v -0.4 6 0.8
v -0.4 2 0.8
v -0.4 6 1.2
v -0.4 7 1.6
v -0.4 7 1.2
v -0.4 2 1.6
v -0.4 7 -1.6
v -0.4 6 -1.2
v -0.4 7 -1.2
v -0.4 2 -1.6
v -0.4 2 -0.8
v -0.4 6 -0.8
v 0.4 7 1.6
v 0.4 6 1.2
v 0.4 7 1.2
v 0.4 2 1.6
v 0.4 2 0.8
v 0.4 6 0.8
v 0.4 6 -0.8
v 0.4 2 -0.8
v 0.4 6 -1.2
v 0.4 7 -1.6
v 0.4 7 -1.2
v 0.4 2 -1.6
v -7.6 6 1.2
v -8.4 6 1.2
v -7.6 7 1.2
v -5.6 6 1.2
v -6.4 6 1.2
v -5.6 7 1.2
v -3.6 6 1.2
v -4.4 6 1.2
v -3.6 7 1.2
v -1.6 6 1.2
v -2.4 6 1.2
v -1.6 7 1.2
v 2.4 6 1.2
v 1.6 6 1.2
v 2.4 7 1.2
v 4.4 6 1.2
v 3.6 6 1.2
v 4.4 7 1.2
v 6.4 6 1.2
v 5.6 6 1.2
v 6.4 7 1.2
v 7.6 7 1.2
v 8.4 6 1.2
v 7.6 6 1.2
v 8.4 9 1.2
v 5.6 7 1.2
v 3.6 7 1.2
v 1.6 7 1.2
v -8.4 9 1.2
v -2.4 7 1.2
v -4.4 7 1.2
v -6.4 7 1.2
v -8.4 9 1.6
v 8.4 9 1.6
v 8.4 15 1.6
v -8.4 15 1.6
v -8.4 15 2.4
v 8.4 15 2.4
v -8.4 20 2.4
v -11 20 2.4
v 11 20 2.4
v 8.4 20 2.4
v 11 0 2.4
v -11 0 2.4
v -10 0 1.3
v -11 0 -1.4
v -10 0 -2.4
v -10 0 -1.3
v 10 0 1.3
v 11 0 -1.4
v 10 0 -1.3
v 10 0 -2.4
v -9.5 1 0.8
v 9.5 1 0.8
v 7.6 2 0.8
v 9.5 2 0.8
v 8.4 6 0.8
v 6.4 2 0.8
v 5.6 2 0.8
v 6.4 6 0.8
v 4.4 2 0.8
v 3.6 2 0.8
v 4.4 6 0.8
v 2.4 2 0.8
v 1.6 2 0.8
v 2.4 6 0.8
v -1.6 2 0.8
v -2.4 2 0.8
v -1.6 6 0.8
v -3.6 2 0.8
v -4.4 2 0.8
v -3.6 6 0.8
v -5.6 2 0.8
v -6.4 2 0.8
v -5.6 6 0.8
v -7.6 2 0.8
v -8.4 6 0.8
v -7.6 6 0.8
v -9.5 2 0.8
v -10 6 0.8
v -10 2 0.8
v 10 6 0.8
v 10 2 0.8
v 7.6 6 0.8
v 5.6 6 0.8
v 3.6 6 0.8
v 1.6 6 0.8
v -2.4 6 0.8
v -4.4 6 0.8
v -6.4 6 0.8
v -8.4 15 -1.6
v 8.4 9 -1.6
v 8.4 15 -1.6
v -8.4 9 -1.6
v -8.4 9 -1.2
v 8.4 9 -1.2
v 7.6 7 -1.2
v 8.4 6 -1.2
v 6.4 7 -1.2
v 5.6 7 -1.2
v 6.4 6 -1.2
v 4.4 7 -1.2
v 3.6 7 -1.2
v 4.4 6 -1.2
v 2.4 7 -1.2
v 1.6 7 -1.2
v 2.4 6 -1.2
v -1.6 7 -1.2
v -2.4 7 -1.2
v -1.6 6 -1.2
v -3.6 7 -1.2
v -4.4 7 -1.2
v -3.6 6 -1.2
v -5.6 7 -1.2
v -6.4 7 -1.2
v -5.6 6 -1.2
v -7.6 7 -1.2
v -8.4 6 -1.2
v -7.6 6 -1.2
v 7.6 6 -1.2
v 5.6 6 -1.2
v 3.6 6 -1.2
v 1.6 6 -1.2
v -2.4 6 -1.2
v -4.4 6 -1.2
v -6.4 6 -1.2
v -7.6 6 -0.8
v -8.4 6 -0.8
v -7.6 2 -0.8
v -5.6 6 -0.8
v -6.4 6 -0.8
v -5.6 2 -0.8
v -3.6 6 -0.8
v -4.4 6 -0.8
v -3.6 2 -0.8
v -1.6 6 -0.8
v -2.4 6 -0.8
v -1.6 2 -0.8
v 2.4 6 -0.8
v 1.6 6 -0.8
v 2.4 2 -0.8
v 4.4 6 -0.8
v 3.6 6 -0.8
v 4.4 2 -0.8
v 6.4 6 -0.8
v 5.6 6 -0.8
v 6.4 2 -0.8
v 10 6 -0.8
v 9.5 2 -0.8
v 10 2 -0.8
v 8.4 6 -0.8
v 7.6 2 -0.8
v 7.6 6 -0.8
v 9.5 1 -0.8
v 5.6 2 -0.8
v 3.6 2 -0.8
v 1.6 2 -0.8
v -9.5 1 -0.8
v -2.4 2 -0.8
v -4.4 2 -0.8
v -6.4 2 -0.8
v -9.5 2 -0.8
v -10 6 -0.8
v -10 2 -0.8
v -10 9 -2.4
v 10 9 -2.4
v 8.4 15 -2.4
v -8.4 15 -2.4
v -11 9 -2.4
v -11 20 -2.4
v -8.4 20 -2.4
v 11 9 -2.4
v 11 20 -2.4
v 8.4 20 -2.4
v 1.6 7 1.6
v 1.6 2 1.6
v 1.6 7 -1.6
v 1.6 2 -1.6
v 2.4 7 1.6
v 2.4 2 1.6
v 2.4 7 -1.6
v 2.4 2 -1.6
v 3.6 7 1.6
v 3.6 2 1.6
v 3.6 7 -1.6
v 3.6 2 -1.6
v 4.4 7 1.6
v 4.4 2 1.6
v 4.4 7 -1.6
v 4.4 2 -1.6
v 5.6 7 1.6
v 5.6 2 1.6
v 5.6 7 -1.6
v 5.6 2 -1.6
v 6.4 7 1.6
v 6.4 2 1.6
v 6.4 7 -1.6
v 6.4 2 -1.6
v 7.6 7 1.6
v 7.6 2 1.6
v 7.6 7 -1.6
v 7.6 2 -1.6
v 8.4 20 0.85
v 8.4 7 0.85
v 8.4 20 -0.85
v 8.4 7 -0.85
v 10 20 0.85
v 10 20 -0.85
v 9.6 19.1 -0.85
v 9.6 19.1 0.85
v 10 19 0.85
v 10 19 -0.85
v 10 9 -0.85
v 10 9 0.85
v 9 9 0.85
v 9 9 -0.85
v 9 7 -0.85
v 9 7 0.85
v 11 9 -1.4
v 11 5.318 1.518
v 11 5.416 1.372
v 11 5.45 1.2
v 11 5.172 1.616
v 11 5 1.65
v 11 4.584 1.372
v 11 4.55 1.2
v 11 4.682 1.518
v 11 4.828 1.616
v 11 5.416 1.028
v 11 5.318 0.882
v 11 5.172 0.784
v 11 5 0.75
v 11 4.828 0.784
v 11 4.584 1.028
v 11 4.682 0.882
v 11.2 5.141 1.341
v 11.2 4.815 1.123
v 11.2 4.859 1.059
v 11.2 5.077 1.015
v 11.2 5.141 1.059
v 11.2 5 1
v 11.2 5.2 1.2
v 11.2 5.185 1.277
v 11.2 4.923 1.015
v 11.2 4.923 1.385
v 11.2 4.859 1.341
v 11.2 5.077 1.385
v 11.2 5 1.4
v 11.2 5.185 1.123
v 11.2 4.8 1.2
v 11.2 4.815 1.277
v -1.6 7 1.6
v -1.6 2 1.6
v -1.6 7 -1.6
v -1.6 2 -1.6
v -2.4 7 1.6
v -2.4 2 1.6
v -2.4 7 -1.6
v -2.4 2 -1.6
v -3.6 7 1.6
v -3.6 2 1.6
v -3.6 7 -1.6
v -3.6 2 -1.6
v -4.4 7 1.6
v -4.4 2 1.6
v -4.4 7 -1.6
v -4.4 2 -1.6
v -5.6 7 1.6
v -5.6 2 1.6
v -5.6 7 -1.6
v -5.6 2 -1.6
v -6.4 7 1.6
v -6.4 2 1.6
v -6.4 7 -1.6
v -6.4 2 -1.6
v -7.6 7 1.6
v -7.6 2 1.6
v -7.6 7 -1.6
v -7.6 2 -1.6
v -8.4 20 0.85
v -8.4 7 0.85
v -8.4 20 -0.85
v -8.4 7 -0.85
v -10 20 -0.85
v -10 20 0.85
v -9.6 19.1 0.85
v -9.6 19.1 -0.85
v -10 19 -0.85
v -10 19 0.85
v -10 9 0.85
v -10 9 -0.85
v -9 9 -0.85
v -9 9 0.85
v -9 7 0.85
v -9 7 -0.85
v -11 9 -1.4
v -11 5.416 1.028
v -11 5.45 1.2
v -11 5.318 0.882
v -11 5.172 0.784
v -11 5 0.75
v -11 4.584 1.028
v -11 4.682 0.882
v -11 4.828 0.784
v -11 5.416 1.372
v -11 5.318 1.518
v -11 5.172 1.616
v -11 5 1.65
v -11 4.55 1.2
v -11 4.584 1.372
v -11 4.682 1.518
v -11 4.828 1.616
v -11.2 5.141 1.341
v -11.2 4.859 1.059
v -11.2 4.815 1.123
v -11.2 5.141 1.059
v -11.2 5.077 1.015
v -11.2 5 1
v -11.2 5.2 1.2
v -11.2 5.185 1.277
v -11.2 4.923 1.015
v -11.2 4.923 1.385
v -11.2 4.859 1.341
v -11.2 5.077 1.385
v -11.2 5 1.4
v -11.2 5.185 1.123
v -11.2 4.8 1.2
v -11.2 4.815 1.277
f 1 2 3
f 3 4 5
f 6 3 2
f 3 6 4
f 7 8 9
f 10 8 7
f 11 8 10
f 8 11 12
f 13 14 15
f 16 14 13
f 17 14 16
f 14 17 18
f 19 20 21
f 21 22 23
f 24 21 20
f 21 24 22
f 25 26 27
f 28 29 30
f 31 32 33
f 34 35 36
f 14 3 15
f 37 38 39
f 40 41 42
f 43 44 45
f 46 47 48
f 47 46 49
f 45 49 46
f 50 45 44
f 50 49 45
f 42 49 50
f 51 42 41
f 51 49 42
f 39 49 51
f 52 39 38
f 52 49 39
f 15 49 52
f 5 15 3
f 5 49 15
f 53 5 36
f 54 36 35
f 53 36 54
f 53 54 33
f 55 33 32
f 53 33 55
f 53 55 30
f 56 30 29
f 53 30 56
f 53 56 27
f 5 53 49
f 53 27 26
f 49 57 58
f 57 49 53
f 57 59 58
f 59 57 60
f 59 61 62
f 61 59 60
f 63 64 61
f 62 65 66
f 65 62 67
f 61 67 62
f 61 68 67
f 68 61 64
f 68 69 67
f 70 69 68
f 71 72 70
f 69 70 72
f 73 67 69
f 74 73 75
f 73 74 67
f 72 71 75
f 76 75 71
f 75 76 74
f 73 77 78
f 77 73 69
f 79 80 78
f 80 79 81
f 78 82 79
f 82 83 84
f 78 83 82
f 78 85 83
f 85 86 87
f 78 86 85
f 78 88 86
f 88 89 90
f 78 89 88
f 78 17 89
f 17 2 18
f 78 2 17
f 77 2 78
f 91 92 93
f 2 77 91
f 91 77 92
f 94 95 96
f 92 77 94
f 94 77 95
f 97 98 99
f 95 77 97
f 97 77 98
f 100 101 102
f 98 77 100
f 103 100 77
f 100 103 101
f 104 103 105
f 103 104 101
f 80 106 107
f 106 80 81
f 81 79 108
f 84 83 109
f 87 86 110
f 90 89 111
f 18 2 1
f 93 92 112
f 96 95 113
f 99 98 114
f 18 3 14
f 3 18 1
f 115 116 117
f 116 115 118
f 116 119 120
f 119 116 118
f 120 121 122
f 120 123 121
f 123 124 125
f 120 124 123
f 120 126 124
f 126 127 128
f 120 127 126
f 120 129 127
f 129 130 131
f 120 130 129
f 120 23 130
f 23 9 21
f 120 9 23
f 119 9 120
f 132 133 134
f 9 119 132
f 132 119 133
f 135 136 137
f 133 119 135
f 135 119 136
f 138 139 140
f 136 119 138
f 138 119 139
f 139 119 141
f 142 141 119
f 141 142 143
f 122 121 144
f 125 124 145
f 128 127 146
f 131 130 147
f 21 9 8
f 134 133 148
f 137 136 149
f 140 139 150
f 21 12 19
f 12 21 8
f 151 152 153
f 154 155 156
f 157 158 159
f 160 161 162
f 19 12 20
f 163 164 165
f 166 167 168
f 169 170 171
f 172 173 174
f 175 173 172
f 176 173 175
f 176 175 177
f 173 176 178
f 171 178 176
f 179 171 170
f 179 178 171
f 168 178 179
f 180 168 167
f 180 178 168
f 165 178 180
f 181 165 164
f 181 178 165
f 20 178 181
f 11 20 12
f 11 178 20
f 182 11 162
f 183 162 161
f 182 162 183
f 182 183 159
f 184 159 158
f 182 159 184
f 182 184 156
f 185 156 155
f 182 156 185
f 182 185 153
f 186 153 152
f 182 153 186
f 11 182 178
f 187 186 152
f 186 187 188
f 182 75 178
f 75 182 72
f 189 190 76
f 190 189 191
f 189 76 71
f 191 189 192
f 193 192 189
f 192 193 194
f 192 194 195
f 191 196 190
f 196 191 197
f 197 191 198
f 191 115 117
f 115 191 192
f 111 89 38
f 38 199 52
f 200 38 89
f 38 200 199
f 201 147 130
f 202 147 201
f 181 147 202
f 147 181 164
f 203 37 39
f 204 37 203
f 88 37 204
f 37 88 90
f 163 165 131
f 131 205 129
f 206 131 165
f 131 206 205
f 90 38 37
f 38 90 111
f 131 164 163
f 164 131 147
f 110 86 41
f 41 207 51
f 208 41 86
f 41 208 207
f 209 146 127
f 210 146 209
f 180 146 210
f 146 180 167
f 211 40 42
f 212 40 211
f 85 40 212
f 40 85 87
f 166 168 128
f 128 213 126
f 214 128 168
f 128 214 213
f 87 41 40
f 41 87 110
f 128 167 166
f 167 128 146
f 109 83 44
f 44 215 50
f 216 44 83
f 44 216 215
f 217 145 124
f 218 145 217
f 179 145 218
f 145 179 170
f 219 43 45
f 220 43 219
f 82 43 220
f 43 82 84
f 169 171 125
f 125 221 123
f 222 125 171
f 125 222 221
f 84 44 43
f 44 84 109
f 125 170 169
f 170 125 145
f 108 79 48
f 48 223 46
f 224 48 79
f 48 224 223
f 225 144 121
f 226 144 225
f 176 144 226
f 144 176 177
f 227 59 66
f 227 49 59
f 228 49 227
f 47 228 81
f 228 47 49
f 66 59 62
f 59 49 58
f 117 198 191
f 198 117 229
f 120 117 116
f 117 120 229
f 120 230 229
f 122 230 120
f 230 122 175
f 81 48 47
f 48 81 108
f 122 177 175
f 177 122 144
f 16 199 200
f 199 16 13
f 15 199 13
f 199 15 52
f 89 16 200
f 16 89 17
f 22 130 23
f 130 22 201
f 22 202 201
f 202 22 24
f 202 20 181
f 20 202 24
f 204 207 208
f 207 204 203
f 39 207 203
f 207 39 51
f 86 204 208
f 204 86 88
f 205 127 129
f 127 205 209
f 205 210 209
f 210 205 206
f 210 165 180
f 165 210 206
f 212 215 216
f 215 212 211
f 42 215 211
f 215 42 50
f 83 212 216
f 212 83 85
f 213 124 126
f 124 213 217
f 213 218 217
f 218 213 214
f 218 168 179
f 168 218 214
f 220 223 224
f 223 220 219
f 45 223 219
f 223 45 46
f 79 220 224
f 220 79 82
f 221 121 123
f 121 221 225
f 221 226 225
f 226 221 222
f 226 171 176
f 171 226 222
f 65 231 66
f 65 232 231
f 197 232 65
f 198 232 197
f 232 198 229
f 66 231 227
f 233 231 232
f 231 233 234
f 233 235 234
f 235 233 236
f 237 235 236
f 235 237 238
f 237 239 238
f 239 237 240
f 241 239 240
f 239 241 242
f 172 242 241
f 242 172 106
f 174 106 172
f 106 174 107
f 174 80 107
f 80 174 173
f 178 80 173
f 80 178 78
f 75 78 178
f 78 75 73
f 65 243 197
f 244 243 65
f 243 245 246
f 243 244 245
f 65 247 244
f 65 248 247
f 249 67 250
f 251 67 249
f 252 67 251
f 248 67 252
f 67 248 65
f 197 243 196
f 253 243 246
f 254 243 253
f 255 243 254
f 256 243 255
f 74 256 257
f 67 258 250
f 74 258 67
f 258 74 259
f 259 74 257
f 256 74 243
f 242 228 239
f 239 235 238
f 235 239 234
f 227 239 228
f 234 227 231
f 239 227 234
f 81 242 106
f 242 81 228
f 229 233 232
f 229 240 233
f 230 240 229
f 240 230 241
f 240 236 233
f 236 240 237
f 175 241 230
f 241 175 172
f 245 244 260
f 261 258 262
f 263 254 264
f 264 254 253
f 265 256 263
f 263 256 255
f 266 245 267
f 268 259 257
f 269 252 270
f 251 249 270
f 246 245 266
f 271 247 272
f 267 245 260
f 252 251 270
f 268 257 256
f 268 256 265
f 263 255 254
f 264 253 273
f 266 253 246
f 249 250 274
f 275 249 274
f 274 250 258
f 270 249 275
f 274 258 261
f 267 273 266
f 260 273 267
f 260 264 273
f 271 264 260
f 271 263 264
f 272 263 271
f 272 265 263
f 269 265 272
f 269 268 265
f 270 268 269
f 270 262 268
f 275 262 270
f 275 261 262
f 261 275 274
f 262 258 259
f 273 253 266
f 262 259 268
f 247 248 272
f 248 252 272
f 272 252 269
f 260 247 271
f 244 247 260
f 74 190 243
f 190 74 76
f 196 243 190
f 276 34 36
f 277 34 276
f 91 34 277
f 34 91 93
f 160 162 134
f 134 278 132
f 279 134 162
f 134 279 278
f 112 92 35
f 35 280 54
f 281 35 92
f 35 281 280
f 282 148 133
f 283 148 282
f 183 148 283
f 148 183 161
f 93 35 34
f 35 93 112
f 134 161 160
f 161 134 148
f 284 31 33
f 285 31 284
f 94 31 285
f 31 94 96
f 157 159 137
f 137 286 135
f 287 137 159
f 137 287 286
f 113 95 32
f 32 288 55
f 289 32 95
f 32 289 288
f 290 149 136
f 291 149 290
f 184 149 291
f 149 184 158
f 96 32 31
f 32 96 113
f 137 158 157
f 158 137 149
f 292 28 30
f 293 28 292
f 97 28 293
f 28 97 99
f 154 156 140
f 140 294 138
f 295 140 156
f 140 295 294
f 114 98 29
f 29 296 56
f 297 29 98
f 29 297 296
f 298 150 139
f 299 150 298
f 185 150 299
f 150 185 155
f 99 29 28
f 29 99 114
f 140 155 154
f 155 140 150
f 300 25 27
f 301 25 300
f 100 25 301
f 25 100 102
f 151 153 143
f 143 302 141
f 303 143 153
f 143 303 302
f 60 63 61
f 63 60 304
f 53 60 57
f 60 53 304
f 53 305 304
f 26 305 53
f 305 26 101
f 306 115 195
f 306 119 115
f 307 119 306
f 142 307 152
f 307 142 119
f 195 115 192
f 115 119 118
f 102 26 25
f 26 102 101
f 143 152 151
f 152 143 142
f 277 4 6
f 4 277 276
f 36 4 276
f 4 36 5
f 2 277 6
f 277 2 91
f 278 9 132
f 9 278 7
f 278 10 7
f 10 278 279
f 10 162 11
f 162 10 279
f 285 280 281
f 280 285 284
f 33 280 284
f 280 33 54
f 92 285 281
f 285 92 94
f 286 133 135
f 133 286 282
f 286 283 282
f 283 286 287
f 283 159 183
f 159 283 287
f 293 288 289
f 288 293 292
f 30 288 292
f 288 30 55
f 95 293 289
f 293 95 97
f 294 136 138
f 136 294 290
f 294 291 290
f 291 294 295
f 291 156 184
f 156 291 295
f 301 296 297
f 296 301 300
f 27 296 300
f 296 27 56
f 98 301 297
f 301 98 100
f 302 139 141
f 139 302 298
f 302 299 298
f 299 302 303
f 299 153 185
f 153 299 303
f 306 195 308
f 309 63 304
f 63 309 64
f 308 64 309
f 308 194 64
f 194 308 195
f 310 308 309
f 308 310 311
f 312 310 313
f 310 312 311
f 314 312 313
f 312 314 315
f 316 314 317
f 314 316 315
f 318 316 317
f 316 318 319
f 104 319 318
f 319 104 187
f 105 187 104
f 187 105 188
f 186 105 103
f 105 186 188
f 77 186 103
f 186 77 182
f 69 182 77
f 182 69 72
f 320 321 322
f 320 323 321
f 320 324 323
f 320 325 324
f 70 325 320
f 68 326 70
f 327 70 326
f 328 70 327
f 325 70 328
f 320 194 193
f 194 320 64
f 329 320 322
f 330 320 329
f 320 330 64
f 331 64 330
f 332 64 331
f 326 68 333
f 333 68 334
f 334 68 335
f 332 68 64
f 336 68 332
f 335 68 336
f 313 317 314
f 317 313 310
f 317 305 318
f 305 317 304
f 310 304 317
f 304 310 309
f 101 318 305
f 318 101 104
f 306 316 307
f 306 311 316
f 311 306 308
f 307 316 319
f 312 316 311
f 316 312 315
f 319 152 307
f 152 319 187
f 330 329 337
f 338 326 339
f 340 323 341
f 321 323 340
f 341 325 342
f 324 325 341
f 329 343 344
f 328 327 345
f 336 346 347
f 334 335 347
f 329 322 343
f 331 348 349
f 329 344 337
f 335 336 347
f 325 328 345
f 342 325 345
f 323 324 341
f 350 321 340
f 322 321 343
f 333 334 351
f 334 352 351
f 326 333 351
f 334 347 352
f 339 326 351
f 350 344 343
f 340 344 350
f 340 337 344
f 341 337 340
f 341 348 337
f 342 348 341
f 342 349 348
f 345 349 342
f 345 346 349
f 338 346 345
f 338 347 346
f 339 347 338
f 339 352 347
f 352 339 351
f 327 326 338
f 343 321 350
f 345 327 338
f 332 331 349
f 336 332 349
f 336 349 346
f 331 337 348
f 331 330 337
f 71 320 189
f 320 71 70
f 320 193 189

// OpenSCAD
CUTAWAY_TOP = true;
CUTAWAY_SIDE = false;
MODEL = "A";
SHOW_PARTS = true;
TRANSFORM = 0;

BOARD_CLIP_DEPTH = 0.4;
BOARD_SIDE_TOL = 0.1;
BOARD_END_TOL = 0.1;
BOARD_THICK_TOL = 0.05;

module mirrcpy(axis) {
    children();
    mirror(axis) children();
}

module final_transform() {
    if(TRANSFORM == 3) {
        rotate([90,0,0])
        children();
    } else if(TRANSFORM == 2) {
        rotate([-90,0,0])
        translate([0,-20,0])
        children();
    } else if(TRANSFORM == 1) {
        translate([0,-10,2.4])
        rotate([0,180,0])
        children();
    } else children();
}

module gen_slice(t) {
    rotate([0,90,0])
    rotate([0,0,90])
    linear_extrude(t, center=true, convexity=10)
    mirrcpy([0,1,0]) children();
}

module slice_contact_a(t, f=0.4) {
    gen_slice(t)
    polygon([
        [0,2.4], [15,2.4], [15,1.6],
        [9,1.6], [9,0.8+f], [7,0.8+f],
        [7,1.6], [2,1.6], [2,0.8],
        [1,0.8], [0,1.3]
    ]);
}

module slice_between_a(t, f=0.4) {
    tt = BOARD_THICK_TOL;
    gen_slice(t)
    polygon([
        [0,2.4], [15,2.4], [15,1.6],
        [9,1.6], [9,0.8+f], [6,0.8+f],
        [6,0.8], [2,0.8], [1,0.8], [0,1.3]
    ]);
}

module slice_contact_b(t, f=0.15) {
    st = 0;
    gen_slice(t) {
        // Front
        polygon([
            [0,2.4], [1.5,2.4], [1.5,2], [1.2,1.6],
            [1.2,0.8], [1,0.8], [0,1.3]
        ]);
        // Back
        polygon([
            [9,2.4], [15,2.4],
            [15,1.6], [9,1.6]
        ]);
    }
    gen_slice(t-2*st) {
        polygon([
            // Inner
            [9,1.6], [8,1.55], [7,1.4],
            [5,0.85], [4.5,0.75], [4,0.7],
            [3.5,0.7], [3,0.75], [2.4,0.9],
            [1.9,1.1],
            // Outer
            [1.9,1.5], [2.3,1.8], [4.3,1.8],
            [5,1.9], [7,2.3], [8,2.4], [9,2.4],
        ]);
    }
}

module slice_between_b(t, f=0.15) {
    tt = BOARD_THICK_TOL;
    gen_slice(t) {
        // Front
        polygon([
            [0,2.4], [1.5,2.4], [1.5,2], [1.2,1.6],
            [1.2,0.8], [1,0.8], [0,1.3]
        ]);
        // Back
        polygon([
            [9,2.4], [15,2.4],
            [15,1.6], [9,1.6]
        ]);
    }
}

module end(inner=5) {
    b = BOARD_CLIP_DEPTH;
    tt = BOARD_THICK_TOL;
    difference() {
        union() {
            linear_extrude(4, center=true, convexity=10)
            polygon([
                [9.5,1], [10,0], [11,0],
                [11,20], [10,20], [10-b,19.1],
                [10,19], [10,9], [9,9],
                [9,7], [10,6], [10,2],
                [9.5,2]
            ]);
            translate([(11+inner)/2,0,0])
            gen_slice(11-inner)
            polygon([
                [0,2.4], [20,2.4], [20,0.8+tt],
                [7,0.8+tt], [6,0.8],
                [1,0.8], [0,1.3]
            ]);
            translate([11,5,1.2])
            rotate([0,90,0])
            cylinder(h=0.2, r1=0.45, r2=0.2, $fn=16);
        }
        translate([10-0.1,-1,-2.4-0.1])
        rotate([0,45,0]) cube([2,10,2]);
    }
}

module shell() {
    difference() {
        union() mirrcpy([1,0,0]) {
            if(MODEL == "C") {
                translate([8,0,0])
                    slice_between_b(1);
                slice_contact_b(15.2);
                end(8.5);
            } else if(MODEL == "B") {
                for(m=[0,2,4,6,8]) translate([m,0,0])
                    slice_between_b(0.8);
                for(m=[1,3,5,7]) translate([m,0,0])
                    slice_contact_b(1.2);
                end(8.4);
            } else {
                for(m=[0,2,4,6,8]) translate([m,0,0])
                    slice_between_a(0.8);
                for(m=[1,3,5,7]) translate([m,0,0])
                    slice_contact_a(1.2);
                end(8.4);
            }
        }
    }
}

module preview_parts() {
    b = BOARD_CLIP_DEPTH+0.4;
    t = BOARD_SIDE_TOL;
    te = BOARD_END_TOL;
    
    color("#AAAA55")
    mirrcpy([1,0,0]) difference() {
        linear_extrude(1.6, center=true, convexity=5)
        polygon([
            [0,7], [8.5,7], [8.5,9+te], [10-t,9+te],
            [10-t,19], [10-b,19], [10-b,20], [0,20]
        ]);
        hull() {
            translate([8.8,10.5,0])
            cylinder(2, d=0.9, center=true, $fn=16);
            translate([10,10.5,0])
            cylinder(2, d=0.9, center=true, $fn=16);
        }
    }
}

final_transform() {
    if($preview) difference() {
        shell();
        if(CUTAWAY_TOP) translate([-12,-1,0])
            cube([24,22,2.5]);
        if(CUTAWAY_SIDE) translate([-12,-1,-2.5])
            cube([12,22,5]);
    } else shell();
    if($preview && SHOW_PARTS) preview_parts();
}
